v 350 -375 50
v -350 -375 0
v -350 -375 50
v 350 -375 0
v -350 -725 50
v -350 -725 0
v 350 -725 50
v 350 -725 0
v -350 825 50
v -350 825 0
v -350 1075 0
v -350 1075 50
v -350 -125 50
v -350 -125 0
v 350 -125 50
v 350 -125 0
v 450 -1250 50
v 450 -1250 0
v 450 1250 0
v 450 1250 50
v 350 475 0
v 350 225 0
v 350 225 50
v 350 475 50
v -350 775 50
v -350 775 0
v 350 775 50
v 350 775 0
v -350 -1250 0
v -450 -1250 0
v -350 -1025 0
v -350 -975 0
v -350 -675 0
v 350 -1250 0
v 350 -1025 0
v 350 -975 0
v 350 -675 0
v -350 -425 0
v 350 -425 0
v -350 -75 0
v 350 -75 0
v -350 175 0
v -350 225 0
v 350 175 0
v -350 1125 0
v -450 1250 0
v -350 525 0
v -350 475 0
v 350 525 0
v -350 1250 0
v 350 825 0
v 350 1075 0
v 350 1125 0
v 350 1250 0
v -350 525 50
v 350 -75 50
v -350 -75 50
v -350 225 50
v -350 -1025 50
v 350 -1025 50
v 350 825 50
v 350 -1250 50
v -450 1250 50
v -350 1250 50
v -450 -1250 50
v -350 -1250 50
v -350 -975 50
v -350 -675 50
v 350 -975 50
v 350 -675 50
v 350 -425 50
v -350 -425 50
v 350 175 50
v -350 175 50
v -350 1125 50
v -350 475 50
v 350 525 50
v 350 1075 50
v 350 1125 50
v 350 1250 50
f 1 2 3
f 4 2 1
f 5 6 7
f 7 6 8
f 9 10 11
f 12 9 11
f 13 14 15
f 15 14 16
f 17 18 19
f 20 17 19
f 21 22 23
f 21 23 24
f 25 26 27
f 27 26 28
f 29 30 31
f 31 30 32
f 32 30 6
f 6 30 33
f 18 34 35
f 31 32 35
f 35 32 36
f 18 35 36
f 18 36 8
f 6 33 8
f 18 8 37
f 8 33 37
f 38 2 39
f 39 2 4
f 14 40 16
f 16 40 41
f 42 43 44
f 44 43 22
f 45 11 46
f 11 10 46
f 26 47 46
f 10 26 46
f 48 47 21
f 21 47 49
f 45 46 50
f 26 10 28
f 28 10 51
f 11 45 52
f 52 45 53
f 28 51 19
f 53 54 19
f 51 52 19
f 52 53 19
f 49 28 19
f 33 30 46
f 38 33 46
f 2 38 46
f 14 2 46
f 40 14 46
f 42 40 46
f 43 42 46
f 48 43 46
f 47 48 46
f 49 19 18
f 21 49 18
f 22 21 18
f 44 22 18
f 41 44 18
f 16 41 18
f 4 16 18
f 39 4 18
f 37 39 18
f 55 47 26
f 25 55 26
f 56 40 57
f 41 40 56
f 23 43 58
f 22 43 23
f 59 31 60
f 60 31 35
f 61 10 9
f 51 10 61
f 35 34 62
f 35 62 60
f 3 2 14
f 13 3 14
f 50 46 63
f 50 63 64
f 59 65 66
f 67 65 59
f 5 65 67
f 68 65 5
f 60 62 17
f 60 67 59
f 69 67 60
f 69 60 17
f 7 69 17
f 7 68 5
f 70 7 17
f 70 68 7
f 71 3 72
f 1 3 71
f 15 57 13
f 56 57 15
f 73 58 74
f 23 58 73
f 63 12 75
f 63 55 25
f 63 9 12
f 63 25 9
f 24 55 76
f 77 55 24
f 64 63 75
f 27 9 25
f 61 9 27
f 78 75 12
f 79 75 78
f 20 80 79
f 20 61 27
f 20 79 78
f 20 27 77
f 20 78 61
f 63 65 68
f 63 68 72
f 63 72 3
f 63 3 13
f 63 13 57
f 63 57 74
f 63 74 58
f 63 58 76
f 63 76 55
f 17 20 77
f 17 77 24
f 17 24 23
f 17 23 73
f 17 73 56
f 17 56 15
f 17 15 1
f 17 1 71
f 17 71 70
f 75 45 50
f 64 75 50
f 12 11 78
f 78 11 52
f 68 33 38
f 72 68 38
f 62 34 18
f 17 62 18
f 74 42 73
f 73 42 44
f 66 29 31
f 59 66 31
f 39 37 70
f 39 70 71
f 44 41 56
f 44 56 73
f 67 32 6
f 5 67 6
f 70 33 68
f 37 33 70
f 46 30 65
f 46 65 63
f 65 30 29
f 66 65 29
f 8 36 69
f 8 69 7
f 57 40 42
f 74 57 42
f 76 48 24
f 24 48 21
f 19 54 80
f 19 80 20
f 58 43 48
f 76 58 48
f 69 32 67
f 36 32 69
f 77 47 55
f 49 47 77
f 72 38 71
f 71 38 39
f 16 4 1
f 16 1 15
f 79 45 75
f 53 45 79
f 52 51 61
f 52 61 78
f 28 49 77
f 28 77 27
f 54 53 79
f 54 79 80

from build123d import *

# Parameters (mm, degrees)
SKETCH_1_W       = 100
SKETCH_1_H       = 2500
EXTRUDE_1_DEPTH  = 50
SKETCH_2_W       = 100
SKETCH_2_H       = 2500
EXTRUDE_2_DEPTH  = 50
SKETCH_3_W       = 800
SKETCH_3_H       = 50
EXTRUDE_3_DEPTH  = 50
SKETCH_4_W       = 800
SKETCH_4_H       = 50
EXTRUDE_4_DEPTH  = 50
SKETCH_5_W       = 800
SKETCH_5_H       = 50
EXTRUDE_5_DEPTH  = 50
SKETCH_6_W       = 800
SKETCH_6_H       = 50
EXTRUDE_6_DEPTH  = 50
SKETCH_7_W       = 800
SKETCH_7_H       = 50
EXTRUDE_7_DEPTH  = 50
SKETCH_8_W       = 800
SKETCH_8_H       = 50
EXTRUDE_8_DEPTH  = 50
SKETCH_9_W       = 800
SKETCH_9_H       = 50
EXTRUDE_9_DEPTH  = 50
SKETCH_10_W      = 800
SKETCH_10_H      = 50
EXTRUDE_10_DEPTH = 50


with BuildPart() as part:
    # 草图1 → 凸台-拉伸1 (new body)
    with BuildSketch(Plane.XY):
        with Locations((-400, 0)):
            Rectangle(SKETCH_1_W, SKETCH_1_H)
    extrude(amount=EXTRUDE_1_DEPTH)



with BuildPart() as body_2:
    # 草图2 → 凸台-拉伸2 (new body)
    with BuildSketch(Plane.XY):
        with Locations((400, 0)):
            Rectangle(SKETCH_2_W, SKETCH_2_H)
    extrude(amount=EXTRUDE_2_DEPTH)


with BuildPart() as part_1:
    add(part.part)

    add(body_2.part)  # 凸台-拉伸3 merges body 2
    # 草图3 → 凸台-拉伸3 (add)
    with BuildSketch(Plane.XY):
        with Locations((0, 1100)):
            Rectangle(SKETCH_3_W, SKETCH_3_H)
    extrude(amount=EXTRUDE_3_DEPTH)

    # 草图4 → 凸台-拉伸4 (add)
    with BuildSketch(Plane.XY):
        with Locations((0, 800)):
            Rectangle(SKETCH_4_W, SKETCH_4_H)
    extrude(amount=EXTRUDE_4_DEPTH)

    # 草图5 → 凸台-拉伸5 (add)
    with BuildSketch(Plane.XY):
        with Locations((0, 500)):
            Rectangle(SKETCH_5_W, SKETCH_5_H)
    extrude(amount=EXTRUDE_5_DEPTH)

    # 草图6 → 凸台-拉伸6 (add)
    with BuildSketch(Plane.XY):
        with Locations((0, 200)):
            Rectangle(SKETCH_6_W, SKETCH_6_H)
    extrude(amount=EXTRUDE_6_DEPTH)

    # 草图7 → 凸台-拉伸7 (add)
    with BuildSketch(Plane.XY):
        with Locations((0, -100)):
            Rectangle(SKETCH_7_W, SKETCH_7_H)
    extrude(amount=EXTRUDE_7_DEPTH)

    # 草图8 → 凸台-拉伸8 (add)
    with BuildSketch(Plane.XY):
        with Locations((0, -400)):
            Rectangle(SKETCH_8_W, SKETCH_8_H)
    extrude(amount=EXTRUDE_8_DEPTH)

    # 草图9 → 凸台-拉伸9 (add)
    with BuildSketch(Plane.XY):
        with Locations((0, -700)):
            Rectangle(SKETCH_9_W, SKETCH_9_H)
    extrude(amount=EXTRUDE_9_DEPTH)

    # 草图10 → 凸台-拉伸10 (add)
    with BuildSketch(Plane.XY):
        with Locations((0, -1000)):
            Rectangle(SKETCH_10_W, SKETCH_10_H)
    extrude(amount=EXTRUDE_10_DEPTH)


solid = part_1.part
